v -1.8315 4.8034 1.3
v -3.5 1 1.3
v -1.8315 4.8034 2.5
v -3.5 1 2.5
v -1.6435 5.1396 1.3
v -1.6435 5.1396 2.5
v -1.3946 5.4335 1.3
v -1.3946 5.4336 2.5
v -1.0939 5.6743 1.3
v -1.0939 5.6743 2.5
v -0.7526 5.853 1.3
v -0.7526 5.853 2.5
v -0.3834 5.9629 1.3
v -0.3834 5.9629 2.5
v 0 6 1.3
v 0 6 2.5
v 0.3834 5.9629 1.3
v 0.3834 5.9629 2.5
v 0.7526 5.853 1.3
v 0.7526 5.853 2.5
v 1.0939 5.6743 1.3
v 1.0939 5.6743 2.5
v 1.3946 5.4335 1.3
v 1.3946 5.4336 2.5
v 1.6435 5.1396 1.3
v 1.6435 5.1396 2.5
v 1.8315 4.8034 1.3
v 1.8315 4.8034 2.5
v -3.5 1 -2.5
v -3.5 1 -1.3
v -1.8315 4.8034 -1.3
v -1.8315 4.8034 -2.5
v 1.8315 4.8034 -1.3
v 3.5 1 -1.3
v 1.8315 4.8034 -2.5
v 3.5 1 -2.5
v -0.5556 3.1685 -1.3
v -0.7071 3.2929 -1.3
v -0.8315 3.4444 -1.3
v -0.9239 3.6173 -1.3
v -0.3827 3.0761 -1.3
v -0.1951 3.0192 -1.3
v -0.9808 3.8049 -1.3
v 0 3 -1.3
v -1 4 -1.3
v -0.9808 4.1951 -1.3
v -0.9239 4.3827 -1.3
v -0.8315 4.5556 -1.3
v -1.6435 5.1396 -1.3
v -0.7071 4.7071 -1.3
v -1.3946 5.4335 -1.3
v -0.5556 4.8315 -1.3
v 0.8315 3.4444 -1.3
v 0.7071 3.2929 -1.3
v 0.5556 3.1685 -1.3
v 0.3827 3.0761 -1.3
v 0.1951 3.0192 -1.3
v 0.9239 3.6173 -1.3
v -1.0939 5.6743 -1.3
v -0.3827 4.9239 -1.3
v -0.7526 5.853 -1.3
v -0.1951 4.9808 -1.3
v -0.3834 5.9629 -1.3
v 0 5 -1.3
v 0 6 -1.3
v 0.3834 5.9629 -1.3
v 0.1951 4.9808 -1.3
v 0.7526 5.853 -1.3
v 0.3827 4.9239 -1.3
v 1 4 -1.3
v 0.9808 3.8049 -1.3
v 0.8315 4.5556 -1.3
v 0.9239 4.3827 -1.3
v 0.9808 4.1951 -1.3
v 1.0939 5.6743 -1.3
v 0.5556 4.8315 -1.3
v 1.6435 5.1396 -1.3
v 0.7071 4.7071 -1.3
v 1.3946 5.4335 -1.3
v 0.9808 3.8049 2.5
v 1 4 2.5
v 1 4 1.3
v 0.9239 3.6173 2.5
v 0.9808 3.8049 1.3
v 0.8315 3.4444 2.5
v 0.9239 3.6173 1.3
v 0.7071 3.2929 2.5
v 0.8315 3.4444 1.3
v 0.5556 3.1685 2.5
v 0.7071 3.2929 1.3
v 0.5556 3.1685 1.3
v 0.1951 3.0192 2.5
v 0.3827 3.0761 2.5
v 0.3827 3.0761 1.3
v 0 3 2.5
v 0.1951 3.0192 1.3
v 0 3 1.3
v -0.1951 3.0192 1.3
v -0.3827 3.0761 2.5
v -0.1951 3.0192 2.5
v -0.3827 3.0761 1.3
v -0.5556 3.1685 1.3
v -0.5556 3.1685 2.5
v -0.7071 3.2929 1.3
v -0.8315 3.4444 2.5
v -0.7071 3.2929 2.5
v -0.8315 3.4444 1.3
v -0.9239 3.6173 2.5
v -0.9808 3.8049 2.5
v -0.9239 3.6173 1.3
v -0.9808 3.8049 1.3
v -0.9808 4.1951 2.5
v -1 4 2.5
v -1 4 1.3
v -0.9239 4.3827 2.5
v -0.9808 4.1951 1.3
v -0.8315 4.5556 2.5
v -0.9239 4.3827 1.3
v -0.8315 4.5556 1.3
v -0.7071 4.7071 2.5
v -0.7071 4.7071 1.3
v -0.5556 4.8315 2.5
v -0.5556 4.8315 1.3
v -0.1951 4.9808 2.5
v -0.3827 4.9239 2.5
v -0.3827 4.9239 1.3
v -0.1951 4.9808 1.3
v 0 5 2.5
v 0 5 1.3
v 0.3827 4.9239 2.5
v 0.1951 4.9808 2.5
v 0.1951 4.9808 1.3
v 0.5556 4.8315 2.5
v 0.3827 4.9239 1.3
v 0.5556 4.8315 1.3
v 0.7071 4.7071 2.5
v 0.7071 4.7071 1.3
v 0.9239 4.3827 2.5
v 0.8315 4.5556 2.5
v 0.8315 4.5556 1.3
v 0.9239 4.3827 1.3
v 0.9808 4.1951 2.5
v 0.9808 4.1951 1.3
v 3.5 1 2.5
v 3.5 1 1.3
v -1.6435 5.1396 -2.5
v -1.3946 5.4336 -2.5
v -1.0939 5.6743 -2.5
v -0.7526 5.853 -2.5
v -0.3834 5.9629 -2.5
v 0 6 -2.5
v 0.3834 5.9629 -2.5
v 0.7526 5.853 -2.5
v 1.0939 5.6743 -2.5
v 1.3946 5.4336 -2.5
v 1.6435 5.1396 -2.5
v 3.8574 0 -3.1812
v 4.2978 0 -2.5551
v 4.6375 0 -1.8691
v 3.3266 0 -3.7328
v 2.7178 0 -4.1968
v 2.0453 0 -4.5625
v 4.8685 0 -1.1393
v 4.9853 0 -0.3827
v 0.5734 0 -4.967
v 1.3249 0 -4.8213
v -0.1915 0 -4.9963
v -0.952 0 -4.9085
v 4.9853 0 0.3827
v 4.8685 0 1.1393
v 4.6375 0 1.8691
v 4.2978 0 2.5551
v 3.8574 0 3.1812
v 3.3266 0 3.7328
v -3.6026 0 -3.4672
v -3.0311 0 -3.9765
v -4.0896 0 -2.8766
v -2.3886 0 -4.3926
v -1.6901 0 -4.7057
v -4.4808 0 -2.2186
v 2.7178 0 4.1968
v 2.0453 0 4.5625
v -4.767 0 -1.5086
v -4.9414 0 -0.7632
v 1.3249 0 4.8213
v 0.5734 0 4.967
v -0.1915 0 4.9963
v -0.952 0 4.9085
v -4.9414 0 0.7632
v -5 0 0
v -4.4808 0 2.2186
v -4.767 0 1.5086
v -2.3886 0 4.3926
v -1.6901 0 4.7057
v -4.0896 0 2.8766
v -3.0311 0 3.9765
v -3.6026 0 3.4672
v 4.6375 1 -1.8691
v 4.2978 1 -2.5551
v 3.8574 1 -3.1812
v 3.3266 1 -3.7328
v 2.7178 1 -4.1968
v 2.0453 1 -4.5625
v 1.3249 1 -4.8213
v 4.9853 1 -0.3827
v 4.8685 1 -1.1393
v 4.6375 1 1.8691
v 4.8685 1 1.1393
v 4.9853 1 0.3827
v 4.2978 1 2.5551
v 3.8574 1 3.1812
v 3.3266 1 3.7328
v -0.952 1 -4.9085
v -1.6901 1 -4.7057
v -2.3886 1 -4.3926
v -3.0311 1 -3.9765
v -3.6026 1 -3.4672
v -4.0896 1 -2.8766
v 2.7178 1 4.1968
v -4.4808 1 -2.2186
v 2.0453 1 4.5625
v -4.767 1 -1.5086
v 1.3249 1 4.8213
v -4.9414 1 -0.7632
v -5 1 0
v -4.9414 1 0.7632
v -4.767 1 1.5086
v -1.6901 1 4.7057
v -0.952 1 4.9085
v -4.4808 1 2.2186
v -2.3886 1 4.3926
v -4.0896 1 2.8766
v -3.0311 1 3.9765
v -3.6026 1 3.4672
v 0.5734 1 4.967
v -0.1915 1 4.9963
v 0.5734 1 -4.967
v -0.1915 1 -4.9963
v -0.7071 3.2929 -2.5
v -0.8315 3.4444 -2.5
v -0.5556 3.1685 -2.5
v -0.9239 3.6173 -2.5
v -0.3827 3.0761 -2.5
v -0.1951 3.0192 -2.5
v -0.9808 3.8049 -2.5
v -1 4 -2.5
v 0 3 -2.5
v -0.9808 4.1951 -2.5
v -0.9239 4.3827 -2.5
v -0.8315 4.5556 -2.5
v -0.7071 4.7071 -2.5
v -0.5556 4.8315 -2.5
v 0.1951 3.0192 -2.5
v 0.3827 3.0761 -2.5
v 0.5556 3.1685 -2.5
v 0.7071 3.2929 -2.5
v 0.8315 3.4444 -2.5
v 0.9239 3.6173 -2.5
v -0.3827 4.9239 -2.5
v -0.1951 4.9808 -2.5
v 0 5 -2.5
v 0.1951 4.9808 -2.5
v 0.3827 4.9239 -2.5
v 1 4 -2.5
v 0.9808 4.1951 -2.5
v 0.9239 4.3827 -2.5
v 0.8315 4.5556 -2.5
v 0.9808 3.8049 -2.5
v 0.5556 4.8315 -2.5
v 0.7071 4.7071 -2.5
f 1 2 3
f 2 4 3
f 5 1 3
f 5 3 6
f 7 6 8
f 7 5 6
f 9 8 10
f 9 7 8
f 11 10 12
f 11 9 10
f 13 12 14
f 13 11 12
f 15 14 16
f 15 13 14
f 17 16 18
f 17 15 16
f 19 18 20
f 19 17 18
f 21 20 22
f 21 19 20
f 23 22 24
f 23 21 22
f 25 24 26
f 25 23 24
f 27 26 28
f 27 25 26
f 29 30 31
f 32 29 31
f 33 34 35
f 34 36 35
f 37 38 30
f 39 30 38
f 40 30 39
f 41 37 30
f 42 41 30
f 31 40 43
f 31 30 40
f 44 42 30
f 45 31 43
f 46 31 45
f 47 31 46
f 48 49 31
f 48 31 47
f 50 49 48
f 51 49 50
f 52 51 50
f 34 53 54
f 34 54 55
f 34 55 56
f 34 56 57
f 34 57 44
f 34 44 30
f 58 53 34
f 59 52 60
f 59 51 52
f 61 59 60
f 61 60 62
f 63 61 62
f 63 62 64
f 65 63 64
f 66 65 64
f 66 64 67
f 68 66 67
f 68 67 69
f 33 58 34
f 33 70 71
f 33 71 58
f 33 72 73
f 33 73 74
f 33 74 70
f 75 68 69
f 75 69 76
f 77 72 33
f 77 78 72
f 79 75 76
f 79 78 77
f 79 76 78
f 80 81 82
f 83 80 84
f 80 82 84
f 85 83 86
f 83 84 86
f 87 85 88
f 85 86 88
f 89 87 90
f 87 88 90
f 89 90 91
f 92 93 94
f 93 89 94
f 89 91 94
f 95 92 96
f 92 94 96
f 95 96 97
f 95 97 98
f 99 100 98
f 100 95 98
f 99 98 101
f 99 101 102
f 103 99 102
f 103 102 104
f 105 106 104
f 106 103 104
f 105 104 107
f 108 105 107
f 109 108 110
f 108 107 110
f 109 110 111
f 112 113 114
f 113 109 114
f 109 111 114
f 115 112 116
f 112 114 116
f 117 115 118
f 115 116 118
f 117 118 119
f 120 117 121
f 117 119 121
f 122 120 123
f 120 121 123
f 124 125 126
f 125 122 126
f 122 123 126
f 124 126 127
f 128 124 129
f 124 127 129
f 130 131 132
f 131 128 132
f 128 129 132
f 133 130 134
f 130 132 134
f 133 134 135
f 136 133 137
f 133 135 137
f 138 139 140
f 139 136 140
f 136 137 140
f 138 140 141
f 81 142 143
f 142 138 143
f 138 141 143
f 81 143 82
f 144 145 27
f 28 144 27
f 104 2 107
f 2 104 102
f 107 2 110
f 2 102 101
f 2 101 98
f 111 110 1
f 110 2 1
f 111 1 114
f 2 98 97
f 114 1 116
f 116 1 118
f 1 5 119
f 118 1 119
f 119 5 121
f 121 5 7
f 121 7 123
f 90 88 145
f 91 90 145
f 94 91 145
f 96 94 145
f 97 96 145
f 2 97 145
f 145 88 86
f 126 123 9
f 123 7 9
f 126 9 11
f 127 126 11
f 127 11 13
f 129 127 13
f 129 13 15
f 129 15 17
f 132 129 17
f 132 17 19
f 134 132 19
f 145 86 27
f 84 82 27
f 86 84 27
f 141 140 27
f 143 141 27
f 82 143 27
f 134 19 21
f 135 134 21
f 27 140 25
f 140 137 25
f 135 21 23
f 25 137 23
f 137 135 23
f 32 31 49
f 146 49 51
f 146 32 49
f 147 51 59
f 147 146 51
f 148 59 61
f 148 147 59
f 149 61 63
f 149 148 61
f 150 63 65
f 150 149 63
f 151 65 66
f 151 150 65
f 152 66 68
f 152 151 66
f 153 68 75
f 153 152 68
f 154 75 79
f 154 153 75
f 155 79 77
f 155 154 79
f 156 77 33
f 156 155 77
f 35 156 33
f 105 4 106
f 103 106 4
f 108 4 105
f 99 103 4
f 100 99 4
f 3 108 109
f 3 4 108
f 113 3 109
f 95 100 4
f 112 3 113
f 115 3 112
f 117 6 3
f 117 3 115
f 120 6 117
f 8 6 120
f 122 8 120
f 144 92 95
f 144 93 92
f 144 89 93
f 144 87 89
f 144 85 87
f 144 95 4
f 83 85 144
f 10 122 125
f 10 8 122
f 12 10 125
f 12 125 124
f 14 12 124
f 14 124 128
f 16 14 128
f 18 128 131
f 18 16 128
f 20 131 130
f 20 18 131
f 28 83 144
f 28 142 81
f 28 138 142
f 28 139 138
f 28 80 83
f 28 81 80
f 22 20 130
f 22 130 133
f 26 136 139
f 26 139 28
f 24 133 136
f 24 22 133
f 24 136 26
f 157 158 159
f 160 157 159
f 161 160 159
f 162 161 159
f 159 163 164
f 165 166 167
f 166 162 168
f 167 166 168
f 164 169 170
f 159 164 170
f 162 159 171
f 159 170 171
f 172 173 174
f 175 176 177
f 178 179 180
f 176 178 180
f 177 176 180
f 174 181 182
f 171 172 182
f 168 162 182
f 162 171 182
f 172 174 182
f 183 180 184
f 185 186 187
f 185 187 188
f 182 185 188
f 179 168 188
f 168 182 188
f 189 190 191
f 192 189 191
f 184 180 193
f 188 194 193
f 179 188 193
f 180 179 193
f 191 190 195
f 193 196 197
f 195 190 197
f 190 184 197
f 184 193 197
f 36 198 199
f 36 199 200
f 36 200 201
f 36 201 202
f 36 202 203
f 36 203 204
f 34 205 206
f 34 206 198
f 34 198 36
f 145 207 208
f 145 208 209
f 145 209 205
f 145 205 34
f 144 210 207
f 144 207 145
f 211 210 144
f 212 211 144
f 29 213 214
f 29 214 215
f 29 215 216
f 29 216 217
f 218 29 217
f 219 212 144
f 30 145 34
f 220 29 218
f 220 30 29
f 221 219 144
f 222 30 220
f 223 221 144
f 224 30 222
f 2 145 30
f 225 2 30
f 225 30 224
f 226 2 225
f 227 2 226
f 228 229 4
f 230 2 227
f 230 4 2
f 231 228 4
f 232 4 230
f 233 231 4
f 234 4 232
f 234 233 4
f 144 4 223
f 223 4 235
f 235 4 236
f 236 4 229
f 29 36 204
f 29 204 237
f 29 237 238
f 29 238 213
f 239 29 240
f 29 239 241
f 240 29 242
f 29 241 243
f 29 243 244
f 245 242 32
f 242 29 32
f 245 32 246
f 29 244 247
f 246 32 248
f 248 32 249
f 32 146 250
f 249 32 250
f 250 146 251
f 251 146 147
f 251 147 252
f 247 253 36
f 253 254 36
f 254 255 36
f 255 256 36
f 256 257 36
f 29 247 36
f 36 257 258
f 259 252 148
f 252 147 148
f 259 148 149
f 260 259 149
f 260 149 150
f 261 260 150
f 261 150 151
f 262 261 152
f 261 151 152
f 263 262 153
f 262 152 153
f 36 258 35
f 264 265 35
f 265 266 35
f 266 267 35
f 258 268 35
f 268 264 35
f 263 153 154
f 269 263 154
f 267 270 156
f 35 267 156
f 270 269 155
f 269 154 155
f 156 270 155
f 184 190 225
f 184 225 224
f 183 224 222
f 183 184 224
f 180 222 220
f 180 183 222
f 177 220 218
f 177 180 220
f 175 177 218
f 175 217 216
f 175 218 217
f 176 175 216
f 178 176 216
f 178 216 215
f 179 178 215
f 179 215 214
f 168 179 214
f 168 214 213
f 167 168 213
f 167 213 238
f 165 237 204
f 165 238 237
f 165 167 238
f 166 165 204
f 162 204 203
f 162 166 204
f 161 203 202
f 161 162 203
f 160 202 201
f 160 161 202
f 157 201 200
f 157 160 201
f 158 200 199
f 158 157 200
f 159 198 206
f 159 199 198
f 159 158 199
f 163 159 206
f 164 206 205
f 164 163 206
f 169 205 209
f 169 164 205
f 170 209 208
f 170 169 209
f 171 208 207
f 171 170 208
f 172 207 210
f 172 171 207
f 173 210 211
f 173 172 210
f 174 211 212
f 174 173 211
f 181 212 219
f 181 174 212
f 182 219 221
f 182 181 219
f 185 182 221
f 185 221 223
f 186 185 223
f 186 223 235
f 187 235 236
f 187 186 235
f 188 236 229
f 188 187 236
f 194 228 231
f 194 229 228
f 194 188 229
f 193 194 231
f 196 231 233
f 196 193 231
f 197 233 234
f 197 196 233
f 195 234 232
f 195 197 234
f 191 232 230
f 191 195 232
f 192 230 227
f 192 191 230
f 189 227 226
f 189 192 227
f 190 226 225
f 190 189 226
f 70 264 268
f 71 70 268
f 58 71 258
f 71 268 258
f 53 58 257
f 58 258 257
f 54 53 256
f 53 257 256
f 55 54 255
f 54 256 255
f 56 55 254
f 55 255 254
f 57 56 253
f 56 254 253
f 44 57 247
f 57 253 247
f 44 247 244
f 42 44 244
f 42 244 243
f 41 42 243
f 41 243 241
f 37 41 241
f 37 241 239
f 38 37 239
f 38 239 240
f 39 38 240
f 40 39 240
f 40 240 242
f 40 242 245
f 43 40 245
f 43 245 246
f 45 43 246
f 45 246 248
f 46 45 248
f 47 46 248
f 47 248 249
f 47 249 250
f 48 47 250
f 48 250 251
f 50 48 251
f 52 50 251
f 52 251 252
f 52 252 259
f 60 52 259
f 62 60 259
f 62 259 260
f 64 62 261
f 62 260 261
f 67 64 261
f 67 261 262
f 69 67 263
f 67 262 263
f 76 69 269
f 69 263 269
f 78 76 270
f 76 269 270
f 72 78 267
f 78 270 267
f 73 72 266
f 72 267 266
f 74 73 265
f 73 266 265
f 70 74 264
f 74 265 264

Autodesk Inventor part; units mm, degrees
ref_plane "YZ Plane" through (0, 0, 0) normal (1, 0, 0) x (0, 1, 0)
ref_plane "XZ Plane" through (0, 0, 0) normal (0, 1, 0) x (-1, 0, 0)
sketch "Sketch1" plane through (0, 0, 0) normal (0, 1, 0) x (-1, 0, 0)
  circle A0 centre (0, 0) radius 5
  dimension "d0" = 10
extrude "Extrusion1" add sketch "Sketch1" along normal blind 1
ref_plane "Work Plane1" through (0, 0, 0) normal (0, 0, 1) x (1, 0, 0)
sketch "Sketch2" plane through (0, 0, 0) normal (0, 0, 1) x (1, 0, 0)
  line L0 (0, 0) -> (0, 4)
  circle A0 centre (0, 4) radius 1
  circle A1 centre (0, 4) radius 2
  line L1 (5, 1) -> (-5, 1) projected
  line L2 (0, 1) -> (3.5, 1)
  line L3 (0, 1) -> (-3.5, 1)
  line L4 (-3.5, 1) -> (-1.8315, 4.8034)
  line L5 (3.5, 1) -> (1.8315, 4.8034)
  dimension "d4" = 4
  dimension "d5" = 2
  dimension "d6" = 4
  dimension "d7" = 3.5
  dimension "d8" = 3.5
extrude "Extrusion2" add sketch "Sketch2" along normal mid plane 5
sketch "Sketch3" plane through (0, 0, 0) normal (0, 0, 1) x (1, 0, 0)
  arc A0 (1.8315, 4.8034) -> (-1.8315, 4.8034) centre (0, 4) ccw projected
  circle A1 centre (0, 4) radius 1
  circle A2 centre (0, 4) radius 2
  line L0 (-1.8315, 4.8034) -> (-3.5, 1) projected
  line L1 (-1.8315, 4.8034) -> (-3.5, 1)
  line L2 (5, 1) -> (-5, 1) projected
  line L3 (3.5, 1) -> (1.8315, 4.8034) projected
  line L4 (1.8315, 4.8034) -> (3.5, 1)
  line L5 (3.5, 1) -> (-3.5, 1)
  point P0 (0, 0)
  dimension "d11" = 4
extrude "Extrusion3" cut sketch "Sketch3" along normal mid plane 2.6 contours A2 A0 | L3 L2 L0 A2 | A1
properties part number "New_Arm_plate"
